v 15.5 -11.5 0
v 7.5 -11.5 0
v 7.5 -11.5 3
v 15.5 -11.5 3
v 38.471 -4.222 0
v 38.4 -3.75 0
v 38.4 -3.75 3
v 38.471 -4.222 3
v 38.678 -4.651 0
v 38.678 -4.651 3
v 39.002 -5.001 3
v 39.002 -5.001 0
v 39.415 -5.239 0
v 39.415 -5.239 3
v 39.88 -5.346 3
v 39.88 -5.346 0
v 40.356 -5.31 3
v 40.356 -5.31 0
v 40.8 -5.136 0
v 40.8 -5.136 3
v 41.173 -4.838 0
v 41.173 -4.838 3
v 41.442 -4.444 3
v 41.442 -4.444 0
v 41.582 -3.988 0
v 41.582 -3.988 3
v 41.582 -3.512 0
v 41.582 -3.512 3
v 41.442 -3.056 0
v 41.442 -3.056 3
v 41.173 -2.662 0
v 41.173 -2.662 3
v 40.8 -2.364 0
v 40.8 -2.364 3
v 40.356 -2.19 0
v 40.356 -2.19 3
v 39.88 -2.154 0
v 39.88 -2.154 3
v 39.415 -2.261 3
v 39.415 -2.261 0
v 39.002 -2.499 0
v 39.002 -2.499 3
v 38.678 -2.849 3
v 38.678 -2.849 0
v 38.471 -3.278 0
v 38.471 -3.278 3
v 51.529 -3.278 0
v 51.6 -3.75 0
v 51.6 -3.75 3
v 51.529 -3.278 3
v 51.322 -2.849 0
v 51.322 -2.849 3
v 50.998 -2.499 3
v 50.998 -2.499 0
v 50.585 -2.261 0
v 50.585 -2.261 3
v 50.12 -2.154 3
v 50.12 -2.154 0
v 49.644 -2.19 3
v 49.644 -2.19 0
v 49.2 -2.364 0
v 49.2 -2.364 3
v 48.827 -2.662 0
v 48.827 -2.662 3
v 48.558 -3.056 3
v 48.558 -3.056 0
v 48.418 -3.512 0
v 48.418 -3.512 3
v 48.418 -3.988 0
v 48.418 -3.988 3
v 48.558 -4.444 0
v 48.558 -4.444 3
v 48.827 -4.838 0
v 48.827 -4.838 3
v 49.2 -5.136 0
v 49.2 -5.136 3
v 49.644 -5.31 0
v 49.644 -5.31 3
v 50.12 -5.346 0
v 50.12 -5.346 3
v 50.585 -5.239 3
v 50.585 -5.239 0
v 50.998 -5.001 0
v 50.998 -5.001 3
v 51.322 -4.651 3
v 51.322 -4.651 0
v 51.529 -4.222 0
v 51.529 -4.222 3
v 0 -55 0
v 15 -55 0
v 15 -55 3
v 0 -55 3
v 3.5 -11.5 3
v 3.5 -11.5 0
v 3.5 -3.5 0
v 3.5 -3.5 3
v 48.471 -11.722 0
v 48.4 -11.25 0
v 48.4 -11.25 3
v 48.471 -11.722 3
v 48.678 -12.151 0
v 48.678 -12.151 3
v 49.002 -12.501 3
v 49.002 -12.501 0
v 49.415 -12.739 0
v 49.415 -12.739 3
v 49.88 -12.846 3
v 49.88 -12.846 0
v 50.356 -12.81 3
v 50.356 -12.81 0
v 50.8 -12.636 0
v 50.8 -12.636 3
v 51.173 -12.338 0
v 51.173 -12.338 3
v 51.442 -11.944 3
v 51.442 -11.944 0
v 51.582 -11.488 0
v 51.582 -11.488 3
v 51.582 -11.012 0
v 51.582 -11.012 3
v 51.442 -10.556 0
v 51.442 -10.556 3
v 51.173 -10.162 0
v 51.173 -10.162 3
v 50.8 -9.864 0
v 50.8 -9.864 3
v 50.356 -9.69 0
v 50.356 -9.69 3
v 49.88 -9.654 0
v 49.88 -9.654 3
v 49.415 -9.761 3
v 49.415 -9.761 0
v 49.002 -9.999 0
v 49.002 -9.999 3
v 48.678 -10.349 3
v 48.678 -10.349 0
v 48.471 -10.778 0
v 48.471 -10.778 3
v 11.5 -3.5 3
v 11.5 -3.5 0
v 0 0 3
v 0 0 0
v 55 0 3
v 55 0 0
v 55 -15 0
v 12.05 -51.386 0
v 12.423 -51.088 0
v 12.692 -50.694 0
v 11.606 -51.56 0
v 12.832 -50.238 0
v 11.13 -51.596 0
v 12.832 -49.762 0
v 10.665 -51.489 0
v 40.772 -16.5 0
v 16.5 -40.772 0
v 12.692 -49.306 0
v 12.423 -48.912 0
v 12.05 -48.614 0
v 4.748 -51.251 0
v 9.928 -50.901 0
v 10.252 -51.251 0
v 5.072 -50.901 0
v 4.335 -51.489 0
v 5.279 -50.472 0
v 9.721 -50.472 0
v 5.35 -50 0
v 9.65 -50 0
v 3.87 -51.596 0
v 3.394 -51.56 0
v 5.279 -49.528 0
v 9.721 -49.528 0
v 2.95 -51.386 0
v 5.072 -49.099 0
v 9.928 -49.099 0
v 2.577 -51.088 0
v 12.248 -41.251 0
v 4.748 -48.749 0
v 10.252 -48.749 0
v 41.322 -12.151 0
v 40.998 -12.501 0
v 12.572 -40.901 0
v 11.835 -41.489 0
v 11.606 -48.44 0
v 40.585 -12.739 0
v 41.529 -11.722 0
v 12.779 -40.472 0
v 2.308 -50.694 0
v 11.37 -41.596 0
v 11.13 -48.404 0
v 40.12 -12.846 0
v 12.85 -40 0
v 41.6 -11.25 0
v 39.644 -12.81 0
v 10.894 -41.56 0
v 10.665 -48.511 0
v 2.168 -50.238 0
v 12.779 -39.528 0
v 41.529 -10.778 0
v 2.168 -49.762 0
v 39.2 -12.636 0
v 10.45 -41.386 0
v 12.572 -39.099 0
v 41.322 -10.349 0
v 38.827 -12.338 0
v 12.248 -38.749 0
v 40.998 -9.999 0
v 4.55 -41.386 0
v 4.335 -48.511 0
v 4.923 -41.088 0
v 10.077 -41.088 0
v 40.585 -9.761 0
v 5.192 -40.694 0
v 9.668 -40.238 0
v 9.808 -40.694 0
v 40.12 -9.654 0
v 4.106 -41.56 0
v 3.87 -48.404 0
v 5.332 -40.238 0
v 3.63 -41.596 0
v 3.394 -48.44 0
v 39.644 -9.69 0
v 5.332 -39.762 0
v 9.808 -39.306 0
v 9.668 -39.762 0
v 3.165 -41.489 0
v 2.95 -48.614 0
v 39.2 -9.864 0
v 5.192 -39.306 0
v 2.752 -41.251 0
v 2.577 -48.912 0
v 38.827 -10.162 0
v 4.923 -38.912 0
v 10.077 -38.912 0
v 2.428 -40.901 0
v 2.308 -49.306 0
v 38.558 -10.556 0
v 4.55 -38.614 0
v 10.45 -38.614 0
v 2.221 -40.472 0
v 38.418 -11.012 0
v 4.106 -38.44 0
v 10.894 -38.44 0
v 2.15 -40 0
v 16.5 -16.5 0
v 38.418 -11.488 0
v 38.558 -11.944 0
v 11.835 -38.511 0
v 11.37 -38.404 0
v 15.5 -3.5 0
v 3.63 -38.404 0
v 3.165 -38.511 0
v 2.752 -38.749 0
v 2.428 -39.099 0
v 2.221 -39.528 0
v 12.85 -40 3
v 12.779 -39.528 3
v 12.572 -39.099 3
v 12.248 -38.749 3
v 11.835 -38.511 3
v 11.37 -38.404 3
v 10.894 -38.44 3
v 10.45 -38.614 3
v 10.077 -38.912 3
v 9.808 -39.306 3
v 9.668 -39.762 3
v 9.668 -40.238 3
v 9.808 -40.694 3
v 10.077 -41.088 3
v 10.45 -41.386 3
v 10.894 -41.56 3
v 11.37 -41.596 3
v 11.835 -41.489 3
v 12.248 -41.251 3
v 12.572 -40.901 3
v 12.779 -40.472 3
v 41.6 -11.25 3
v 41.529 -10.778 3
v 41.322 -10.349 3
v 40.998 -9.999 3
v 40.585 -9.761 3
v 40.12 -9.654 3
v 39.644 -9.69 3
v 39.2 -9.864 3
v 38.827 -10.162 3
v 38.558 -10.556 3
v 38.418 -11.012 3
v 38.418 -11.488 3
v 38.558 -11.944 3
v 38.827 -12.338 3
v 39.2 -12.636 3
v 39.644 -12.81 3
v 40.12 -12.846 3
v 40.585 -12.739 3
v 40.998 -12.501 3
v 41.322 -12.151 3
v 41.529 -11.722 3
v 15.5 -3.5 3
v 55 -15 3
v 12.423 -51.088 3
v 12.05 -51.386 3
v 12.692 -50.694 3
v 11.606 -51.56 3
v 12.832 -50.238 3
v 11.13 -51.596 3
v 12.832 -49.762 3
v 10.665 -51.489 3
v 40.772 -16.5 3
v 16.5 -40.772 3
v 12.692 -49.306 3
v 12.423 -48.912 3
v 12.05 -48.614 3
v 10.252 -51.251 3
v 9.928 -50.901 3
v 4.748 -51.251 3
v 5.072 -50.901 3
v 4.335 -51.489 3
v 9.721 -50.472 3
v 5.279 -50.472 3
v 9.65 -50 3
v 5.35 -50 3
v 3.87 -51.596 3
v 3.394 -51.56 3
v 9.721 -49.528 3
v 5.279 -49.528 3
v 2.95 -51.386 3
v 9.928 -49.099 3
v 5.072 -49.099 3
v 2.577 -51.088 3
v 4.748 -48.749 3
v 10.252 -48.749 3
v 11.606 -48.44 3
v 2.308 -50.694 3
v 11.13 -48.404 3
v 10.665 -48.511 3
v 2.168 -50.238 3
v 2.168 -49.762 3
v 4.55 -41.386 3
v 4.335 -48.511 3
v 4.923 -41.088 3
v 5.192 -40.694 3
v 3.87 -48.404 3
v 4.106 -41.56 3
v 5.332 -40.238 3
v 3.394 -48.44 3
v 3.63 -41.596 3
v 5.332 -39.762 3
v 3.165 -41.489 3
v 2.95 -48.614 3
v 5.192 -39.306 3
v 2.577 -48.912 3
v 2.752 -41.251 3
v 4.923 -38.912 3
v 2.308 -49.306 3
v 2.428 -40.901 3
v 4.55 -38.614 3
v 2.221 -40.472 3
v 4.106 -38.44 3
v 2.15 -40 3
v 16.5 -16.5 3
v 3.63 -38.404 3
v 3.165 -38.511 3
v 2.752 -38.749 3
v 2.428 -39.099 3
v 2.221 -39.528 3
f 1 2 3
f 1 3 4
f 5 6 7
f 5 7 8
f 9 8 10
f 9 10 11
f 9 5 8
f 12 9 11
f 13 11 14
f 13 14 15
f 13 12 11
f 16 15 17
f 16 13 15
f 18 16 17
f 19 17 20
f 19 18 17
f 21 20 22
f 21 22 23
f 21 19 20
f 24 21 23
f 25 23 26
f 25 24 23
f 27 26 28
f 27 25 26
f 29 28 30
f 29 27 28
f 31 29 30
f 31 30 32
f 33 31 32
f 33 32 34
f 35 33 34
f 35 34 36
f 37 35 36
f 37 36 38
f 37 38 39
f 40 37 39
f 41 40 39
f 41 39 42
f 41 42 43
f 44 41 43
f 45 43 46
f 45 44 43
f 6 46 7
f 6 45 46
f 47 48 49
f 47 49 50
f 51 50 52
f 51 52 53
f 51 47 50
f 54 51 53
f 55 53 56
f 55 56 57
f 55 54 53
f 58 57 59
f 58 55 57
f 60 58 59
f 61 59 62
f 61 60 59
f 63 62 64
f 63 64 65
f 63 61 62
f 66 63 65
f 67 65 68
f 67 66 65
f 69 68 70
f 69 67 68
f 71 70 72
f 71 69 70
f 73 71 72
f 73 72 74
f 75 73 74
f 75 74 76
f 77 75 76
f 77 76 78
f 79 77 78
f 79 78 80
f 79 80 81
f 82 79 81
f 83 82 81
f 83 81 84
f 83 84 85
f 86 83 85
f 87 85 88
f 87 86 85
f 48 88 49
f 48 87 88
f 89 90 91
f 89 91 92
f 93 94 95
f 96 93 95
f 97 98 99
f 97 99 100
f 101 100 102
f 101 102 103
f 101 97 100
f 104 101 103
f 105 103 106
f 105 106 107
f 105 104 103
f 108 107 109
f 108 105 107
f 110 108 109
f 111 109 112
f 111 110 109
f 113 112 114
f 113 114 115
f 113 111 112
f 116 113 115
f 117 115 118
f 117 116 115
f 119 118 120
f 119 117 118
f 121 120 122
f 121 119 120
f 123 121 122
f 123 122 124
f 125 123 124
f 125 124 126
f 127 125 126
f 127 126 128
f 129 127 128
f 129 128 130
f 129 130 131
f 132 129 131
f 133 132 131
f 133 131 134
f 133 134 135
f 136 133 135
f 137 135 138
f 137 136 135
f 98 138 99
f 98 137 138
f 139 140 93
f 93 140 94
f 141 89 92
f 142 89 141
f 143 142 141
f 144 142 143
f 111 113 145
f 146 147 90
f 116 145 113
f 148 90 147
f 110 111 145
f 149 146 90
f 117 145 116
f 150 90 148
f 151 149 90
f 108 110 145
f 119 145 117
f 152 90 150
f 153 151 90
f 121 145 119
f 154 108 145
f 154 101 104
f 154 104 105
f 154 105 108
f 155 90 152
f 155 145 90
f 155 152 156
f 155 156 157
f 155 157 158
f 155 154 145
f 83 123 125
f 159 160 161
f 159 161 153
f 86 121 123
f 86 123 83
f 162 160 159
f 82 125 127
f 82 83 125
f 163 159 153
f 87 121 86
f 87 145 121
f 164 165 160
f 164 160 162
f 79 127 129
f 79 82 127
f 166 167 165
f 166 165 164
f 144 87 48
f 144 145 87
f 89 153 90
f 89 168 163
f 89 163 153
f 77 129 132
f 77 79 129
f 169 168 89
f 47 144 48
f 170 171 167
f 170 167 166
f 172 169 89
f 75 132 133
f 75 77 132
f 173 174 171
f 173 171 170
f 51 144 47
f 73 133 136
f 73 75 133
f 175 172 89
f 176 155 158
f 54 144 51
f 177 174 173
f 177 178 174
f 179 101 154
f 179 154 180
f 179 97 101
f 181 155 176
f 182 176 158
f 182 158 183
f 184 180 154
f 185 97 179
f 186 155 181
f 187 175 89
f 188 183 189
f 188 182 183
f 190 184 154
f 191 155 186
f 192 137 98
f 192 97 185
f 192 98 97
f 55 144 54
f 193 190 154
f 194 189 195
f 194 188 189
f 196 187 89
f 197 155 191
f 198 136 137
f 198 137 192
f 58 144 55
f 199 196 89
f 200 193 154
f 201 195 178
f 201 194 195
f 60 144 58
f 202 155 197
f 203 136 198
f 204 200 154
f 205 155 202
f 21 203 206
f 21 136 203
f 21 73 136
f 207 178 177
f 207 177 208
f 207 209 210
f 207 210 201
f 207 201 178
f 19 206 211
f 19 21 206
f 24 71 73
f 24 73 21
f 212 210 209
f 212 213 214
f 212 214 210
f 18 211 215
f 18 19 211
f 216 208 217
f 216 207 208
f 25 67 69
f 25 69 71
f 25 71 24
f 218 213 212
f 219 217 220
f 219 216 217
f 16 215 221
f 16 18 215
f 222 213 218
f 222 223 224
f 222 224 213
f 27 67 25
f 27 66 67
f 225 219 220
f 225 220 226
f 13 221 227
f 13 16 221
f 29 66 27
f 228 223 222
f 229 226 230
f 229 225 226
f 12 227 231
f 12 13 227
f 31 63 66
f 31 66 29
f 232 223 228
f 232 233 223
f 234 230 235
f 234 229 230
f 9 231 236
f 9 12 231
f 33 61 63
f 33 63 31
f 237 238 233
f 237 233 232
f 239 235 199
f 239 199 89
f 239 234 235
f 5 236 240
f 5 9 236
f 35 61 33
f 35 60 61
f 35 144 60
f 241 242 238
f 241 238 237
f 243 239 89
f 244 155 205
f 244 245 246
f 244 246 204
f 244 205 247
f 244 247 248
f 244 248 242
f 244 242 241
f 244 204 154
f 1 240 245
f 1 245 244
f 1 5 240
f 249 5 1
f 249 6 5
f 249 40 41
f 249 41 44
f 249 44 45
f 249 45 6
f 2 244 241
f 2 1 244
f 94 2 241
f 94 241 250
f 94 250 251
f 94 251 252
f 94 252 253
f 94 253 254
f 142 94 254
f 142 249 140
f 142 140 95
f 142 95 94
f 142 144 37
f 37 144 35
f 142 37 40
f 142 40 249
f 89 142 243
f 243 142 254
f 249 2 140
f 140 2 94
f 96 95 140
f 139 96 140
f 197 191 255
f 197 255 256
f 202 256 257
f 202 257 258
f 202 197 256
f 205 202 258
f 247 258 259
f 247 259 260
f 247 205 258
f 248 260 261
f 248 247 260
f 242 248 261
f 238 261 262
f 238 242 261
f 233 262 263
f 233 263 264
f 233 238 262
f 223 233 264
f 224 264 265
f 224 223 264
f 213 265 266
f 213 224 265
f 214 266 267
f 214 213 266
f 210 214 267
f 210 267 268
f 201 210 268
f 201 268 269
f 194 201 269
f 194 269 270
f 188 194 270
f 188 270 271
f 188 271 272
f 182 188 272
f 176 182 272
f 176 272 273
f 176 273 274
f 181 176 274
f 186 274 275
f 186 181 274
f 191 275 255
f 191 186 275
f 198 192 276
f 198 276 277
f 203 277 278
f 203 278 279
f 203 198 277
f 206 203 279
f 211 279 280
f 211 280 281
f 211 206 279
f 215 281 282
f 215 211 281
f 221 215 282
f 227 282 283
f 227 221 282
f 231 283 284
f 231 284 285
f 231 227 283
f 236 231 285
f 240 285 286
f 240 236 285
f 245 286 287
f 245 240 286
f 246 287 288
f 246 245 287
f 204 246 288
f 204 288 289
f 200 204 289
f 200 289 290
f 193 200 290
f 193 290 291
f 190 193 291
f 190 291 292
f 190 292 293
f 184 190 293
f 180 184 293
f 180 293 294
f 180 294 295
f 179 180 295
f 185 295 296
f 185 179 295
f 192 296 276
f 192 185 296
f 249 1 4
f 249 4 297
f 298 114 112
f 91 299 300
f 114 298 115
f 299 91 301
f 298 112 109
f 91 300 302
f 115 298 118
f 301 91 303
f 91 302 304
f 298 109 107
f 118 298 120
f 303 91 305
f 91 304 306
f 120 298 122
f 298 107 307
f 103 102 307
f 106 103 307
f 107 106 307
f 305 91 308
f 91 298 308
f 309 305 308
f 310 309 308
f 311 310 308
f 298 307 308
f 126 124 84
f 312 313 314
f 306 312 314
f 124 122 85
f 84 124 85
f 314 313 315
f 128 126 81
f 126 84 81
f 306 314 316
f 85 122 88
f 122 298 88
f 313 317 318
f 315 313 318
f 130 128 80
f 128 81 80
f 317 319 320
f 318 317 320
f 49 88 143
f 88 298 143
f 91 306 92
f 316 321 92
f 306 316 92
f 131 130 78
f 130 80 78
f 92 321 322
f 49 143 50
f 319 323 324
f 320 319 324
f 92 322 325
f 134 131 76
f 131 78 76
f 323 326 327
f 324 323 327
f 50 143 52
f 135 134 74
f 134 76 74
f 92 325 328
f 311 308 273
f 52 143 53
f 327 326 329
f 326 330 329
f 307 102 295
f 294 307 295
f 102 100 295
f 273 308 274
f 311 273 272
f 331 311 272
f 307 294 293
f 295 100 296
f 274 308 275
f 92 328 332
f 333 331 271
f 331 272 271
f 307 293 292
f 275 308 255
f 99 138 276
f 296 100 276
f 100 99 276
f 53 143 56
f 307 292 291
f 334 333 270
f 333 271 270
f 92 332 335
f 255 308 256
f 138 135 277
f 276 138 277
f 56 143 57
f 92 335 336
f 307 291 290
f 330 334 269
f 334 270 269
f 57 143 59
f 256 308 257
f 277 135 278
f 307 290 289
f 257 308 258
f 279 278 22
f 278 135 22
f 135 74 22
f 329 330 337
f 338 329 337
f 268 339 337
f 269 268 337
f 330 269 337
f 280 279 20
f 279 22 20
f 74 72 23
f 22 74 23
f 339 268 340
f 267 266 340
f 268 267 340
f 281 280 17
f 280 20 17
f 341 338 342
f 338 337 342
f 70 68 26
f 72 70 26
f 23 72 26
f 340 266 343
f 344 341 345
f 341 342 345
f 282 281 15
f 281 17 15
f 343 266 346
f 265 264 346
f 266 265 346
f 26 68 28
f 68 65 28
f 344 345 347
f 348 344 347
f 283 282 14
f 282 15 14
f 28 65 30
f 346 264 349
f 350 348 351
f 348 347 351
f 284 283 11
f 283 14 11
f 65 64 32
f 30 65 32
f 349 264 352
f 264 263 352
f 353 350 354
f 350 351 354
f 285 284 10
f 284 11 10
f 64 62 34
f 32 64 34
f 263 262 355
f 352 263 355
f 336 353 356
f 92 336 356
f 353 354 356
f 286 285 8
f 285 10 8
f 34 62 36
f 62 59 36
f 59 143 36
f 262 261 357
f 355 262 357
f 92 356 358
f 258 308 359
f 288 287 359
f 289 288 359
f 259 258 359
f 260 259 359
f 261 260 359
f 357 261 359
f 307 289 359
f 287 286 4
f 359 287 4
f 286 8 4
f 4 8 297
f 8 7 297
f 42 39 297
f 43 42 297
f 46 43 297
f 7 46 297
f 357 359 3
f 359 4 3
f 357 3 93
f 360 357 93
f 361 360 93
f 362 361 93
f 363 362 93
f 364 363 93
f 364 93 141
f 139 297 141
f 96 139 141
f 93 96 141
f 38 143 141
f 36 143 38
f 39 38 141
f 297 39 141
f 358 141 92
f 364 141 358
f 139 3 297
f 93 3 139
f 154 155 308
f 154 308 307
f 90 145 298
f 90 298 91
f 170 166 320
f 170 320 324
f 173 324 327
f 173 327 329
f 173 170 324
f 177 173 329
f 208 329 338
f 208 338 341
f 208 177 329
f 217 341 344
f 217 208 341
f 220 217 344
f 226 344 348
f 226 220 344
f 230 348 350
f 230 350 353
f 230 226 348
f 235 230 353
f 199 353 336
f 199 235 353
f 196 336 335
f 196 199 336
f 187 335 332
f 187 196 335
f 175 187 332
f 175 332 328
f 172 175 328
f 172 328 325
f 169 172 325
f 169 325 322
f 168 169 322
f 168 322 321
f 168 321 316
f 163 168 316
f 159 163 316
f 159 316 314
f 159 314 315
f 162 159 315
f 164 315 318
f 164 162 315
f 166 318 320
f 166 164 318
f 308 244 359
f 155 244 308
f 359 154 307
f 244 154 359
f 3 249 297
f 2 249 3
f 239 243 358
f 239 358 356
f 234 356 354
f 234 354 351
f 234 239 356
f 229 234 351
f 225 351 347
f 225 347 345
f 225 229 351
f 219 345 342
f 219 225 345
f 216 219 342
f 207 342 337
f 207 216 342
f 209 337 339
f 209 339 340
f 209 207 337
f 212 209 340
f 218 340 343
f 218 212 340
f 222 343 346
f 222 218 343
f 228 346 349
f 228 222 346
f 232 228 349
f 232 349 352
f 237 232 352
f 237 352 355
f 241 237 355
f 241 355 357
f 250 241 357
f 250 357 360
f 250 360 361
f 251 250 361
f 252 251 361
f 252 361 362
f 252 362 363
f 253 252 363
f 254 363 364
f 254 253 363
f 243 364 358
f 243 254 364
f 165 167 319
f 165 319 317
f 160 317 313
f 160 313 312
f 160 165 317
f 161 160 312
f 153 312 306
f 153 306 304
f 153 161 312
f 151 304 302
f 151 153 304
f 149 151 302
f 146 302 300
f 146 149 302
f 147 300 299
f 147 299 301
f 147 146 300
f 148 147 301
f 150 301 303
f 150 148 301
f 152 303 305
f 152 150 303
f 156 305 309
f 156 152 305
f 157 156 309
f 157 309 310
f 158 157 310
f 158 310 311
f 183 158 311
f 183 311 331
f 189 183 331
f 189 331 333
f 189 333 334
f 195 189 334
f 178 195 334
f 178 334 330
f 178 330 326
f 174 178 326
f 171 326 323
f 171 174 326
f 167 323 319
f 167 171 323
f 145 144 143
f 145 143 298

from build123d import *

# Parameters (mm, degrees)
SKETCH_1_R      = 1.6
EXTRUDE_1_DEPTH = 3


with BuildPart() as part:
    # 草图1 → 凸台-拉伸1 (new body)
    with BuildSketch(Plane.XY):
        Polygon((0, 0), (55, 0), (55, -15), (15, -55), (0, -55), align=None)
        with Locations((3.75, -50)):
            Circle(SKETCH_1_R, mode=Mode.SUBTRACT)
        with Locations(Location((11.25, -50, 0), (0, 0, 180))):
            Circle(SKETCH_1_R, mode=Mode.SUBTRACT)
        with Locations((11.25, -40)):
            Circle(SKETCH_1_R, mode=Mode.SUBTRACT)
        with Locations(Location((3.75, -40, 0), (0, 0, 180))):
            Circle(SKETCH_1_R, mode=Mode.SUBTRACT)
        with Locations((50, -3.75)):
            Circle(SKETCH_1_R, mode=Mode.SUBTRACT)
        with Locations(Location((50, -11.25, 0), (0, 0, 180))):
            Circle(SKETCH_1_R, mode=Mode.SUBTRACT)
        with Locations((40, -11.25)):
            Circle(SKETCH_1_R, mode=Mode.SUBTRACT)
        with Locations(Location((40, -3.75, 0), (0, 0, 180))):
            Circle(SKETCH_1_R, mode=Mode.SUBTRACT)
        Polygon((16.5, -16.5), (16.5, -40.772077939), (40.772077939, -16.5), align=None, mode=Mode.SUBTRACT)
        Polygon((3.5, -3.5), (11.5, -3.5), (3.5, -11.5), align=None, mode=Mode.SUBTRACT)
        Polygon((15.5, -3.5), (7.5, -11.5), (15.5, -11.5), align=None, mode=Mode.SUBTRACT)
    extrude(amount=EXTRUDE_1_DEPTH)


solid = part.part
